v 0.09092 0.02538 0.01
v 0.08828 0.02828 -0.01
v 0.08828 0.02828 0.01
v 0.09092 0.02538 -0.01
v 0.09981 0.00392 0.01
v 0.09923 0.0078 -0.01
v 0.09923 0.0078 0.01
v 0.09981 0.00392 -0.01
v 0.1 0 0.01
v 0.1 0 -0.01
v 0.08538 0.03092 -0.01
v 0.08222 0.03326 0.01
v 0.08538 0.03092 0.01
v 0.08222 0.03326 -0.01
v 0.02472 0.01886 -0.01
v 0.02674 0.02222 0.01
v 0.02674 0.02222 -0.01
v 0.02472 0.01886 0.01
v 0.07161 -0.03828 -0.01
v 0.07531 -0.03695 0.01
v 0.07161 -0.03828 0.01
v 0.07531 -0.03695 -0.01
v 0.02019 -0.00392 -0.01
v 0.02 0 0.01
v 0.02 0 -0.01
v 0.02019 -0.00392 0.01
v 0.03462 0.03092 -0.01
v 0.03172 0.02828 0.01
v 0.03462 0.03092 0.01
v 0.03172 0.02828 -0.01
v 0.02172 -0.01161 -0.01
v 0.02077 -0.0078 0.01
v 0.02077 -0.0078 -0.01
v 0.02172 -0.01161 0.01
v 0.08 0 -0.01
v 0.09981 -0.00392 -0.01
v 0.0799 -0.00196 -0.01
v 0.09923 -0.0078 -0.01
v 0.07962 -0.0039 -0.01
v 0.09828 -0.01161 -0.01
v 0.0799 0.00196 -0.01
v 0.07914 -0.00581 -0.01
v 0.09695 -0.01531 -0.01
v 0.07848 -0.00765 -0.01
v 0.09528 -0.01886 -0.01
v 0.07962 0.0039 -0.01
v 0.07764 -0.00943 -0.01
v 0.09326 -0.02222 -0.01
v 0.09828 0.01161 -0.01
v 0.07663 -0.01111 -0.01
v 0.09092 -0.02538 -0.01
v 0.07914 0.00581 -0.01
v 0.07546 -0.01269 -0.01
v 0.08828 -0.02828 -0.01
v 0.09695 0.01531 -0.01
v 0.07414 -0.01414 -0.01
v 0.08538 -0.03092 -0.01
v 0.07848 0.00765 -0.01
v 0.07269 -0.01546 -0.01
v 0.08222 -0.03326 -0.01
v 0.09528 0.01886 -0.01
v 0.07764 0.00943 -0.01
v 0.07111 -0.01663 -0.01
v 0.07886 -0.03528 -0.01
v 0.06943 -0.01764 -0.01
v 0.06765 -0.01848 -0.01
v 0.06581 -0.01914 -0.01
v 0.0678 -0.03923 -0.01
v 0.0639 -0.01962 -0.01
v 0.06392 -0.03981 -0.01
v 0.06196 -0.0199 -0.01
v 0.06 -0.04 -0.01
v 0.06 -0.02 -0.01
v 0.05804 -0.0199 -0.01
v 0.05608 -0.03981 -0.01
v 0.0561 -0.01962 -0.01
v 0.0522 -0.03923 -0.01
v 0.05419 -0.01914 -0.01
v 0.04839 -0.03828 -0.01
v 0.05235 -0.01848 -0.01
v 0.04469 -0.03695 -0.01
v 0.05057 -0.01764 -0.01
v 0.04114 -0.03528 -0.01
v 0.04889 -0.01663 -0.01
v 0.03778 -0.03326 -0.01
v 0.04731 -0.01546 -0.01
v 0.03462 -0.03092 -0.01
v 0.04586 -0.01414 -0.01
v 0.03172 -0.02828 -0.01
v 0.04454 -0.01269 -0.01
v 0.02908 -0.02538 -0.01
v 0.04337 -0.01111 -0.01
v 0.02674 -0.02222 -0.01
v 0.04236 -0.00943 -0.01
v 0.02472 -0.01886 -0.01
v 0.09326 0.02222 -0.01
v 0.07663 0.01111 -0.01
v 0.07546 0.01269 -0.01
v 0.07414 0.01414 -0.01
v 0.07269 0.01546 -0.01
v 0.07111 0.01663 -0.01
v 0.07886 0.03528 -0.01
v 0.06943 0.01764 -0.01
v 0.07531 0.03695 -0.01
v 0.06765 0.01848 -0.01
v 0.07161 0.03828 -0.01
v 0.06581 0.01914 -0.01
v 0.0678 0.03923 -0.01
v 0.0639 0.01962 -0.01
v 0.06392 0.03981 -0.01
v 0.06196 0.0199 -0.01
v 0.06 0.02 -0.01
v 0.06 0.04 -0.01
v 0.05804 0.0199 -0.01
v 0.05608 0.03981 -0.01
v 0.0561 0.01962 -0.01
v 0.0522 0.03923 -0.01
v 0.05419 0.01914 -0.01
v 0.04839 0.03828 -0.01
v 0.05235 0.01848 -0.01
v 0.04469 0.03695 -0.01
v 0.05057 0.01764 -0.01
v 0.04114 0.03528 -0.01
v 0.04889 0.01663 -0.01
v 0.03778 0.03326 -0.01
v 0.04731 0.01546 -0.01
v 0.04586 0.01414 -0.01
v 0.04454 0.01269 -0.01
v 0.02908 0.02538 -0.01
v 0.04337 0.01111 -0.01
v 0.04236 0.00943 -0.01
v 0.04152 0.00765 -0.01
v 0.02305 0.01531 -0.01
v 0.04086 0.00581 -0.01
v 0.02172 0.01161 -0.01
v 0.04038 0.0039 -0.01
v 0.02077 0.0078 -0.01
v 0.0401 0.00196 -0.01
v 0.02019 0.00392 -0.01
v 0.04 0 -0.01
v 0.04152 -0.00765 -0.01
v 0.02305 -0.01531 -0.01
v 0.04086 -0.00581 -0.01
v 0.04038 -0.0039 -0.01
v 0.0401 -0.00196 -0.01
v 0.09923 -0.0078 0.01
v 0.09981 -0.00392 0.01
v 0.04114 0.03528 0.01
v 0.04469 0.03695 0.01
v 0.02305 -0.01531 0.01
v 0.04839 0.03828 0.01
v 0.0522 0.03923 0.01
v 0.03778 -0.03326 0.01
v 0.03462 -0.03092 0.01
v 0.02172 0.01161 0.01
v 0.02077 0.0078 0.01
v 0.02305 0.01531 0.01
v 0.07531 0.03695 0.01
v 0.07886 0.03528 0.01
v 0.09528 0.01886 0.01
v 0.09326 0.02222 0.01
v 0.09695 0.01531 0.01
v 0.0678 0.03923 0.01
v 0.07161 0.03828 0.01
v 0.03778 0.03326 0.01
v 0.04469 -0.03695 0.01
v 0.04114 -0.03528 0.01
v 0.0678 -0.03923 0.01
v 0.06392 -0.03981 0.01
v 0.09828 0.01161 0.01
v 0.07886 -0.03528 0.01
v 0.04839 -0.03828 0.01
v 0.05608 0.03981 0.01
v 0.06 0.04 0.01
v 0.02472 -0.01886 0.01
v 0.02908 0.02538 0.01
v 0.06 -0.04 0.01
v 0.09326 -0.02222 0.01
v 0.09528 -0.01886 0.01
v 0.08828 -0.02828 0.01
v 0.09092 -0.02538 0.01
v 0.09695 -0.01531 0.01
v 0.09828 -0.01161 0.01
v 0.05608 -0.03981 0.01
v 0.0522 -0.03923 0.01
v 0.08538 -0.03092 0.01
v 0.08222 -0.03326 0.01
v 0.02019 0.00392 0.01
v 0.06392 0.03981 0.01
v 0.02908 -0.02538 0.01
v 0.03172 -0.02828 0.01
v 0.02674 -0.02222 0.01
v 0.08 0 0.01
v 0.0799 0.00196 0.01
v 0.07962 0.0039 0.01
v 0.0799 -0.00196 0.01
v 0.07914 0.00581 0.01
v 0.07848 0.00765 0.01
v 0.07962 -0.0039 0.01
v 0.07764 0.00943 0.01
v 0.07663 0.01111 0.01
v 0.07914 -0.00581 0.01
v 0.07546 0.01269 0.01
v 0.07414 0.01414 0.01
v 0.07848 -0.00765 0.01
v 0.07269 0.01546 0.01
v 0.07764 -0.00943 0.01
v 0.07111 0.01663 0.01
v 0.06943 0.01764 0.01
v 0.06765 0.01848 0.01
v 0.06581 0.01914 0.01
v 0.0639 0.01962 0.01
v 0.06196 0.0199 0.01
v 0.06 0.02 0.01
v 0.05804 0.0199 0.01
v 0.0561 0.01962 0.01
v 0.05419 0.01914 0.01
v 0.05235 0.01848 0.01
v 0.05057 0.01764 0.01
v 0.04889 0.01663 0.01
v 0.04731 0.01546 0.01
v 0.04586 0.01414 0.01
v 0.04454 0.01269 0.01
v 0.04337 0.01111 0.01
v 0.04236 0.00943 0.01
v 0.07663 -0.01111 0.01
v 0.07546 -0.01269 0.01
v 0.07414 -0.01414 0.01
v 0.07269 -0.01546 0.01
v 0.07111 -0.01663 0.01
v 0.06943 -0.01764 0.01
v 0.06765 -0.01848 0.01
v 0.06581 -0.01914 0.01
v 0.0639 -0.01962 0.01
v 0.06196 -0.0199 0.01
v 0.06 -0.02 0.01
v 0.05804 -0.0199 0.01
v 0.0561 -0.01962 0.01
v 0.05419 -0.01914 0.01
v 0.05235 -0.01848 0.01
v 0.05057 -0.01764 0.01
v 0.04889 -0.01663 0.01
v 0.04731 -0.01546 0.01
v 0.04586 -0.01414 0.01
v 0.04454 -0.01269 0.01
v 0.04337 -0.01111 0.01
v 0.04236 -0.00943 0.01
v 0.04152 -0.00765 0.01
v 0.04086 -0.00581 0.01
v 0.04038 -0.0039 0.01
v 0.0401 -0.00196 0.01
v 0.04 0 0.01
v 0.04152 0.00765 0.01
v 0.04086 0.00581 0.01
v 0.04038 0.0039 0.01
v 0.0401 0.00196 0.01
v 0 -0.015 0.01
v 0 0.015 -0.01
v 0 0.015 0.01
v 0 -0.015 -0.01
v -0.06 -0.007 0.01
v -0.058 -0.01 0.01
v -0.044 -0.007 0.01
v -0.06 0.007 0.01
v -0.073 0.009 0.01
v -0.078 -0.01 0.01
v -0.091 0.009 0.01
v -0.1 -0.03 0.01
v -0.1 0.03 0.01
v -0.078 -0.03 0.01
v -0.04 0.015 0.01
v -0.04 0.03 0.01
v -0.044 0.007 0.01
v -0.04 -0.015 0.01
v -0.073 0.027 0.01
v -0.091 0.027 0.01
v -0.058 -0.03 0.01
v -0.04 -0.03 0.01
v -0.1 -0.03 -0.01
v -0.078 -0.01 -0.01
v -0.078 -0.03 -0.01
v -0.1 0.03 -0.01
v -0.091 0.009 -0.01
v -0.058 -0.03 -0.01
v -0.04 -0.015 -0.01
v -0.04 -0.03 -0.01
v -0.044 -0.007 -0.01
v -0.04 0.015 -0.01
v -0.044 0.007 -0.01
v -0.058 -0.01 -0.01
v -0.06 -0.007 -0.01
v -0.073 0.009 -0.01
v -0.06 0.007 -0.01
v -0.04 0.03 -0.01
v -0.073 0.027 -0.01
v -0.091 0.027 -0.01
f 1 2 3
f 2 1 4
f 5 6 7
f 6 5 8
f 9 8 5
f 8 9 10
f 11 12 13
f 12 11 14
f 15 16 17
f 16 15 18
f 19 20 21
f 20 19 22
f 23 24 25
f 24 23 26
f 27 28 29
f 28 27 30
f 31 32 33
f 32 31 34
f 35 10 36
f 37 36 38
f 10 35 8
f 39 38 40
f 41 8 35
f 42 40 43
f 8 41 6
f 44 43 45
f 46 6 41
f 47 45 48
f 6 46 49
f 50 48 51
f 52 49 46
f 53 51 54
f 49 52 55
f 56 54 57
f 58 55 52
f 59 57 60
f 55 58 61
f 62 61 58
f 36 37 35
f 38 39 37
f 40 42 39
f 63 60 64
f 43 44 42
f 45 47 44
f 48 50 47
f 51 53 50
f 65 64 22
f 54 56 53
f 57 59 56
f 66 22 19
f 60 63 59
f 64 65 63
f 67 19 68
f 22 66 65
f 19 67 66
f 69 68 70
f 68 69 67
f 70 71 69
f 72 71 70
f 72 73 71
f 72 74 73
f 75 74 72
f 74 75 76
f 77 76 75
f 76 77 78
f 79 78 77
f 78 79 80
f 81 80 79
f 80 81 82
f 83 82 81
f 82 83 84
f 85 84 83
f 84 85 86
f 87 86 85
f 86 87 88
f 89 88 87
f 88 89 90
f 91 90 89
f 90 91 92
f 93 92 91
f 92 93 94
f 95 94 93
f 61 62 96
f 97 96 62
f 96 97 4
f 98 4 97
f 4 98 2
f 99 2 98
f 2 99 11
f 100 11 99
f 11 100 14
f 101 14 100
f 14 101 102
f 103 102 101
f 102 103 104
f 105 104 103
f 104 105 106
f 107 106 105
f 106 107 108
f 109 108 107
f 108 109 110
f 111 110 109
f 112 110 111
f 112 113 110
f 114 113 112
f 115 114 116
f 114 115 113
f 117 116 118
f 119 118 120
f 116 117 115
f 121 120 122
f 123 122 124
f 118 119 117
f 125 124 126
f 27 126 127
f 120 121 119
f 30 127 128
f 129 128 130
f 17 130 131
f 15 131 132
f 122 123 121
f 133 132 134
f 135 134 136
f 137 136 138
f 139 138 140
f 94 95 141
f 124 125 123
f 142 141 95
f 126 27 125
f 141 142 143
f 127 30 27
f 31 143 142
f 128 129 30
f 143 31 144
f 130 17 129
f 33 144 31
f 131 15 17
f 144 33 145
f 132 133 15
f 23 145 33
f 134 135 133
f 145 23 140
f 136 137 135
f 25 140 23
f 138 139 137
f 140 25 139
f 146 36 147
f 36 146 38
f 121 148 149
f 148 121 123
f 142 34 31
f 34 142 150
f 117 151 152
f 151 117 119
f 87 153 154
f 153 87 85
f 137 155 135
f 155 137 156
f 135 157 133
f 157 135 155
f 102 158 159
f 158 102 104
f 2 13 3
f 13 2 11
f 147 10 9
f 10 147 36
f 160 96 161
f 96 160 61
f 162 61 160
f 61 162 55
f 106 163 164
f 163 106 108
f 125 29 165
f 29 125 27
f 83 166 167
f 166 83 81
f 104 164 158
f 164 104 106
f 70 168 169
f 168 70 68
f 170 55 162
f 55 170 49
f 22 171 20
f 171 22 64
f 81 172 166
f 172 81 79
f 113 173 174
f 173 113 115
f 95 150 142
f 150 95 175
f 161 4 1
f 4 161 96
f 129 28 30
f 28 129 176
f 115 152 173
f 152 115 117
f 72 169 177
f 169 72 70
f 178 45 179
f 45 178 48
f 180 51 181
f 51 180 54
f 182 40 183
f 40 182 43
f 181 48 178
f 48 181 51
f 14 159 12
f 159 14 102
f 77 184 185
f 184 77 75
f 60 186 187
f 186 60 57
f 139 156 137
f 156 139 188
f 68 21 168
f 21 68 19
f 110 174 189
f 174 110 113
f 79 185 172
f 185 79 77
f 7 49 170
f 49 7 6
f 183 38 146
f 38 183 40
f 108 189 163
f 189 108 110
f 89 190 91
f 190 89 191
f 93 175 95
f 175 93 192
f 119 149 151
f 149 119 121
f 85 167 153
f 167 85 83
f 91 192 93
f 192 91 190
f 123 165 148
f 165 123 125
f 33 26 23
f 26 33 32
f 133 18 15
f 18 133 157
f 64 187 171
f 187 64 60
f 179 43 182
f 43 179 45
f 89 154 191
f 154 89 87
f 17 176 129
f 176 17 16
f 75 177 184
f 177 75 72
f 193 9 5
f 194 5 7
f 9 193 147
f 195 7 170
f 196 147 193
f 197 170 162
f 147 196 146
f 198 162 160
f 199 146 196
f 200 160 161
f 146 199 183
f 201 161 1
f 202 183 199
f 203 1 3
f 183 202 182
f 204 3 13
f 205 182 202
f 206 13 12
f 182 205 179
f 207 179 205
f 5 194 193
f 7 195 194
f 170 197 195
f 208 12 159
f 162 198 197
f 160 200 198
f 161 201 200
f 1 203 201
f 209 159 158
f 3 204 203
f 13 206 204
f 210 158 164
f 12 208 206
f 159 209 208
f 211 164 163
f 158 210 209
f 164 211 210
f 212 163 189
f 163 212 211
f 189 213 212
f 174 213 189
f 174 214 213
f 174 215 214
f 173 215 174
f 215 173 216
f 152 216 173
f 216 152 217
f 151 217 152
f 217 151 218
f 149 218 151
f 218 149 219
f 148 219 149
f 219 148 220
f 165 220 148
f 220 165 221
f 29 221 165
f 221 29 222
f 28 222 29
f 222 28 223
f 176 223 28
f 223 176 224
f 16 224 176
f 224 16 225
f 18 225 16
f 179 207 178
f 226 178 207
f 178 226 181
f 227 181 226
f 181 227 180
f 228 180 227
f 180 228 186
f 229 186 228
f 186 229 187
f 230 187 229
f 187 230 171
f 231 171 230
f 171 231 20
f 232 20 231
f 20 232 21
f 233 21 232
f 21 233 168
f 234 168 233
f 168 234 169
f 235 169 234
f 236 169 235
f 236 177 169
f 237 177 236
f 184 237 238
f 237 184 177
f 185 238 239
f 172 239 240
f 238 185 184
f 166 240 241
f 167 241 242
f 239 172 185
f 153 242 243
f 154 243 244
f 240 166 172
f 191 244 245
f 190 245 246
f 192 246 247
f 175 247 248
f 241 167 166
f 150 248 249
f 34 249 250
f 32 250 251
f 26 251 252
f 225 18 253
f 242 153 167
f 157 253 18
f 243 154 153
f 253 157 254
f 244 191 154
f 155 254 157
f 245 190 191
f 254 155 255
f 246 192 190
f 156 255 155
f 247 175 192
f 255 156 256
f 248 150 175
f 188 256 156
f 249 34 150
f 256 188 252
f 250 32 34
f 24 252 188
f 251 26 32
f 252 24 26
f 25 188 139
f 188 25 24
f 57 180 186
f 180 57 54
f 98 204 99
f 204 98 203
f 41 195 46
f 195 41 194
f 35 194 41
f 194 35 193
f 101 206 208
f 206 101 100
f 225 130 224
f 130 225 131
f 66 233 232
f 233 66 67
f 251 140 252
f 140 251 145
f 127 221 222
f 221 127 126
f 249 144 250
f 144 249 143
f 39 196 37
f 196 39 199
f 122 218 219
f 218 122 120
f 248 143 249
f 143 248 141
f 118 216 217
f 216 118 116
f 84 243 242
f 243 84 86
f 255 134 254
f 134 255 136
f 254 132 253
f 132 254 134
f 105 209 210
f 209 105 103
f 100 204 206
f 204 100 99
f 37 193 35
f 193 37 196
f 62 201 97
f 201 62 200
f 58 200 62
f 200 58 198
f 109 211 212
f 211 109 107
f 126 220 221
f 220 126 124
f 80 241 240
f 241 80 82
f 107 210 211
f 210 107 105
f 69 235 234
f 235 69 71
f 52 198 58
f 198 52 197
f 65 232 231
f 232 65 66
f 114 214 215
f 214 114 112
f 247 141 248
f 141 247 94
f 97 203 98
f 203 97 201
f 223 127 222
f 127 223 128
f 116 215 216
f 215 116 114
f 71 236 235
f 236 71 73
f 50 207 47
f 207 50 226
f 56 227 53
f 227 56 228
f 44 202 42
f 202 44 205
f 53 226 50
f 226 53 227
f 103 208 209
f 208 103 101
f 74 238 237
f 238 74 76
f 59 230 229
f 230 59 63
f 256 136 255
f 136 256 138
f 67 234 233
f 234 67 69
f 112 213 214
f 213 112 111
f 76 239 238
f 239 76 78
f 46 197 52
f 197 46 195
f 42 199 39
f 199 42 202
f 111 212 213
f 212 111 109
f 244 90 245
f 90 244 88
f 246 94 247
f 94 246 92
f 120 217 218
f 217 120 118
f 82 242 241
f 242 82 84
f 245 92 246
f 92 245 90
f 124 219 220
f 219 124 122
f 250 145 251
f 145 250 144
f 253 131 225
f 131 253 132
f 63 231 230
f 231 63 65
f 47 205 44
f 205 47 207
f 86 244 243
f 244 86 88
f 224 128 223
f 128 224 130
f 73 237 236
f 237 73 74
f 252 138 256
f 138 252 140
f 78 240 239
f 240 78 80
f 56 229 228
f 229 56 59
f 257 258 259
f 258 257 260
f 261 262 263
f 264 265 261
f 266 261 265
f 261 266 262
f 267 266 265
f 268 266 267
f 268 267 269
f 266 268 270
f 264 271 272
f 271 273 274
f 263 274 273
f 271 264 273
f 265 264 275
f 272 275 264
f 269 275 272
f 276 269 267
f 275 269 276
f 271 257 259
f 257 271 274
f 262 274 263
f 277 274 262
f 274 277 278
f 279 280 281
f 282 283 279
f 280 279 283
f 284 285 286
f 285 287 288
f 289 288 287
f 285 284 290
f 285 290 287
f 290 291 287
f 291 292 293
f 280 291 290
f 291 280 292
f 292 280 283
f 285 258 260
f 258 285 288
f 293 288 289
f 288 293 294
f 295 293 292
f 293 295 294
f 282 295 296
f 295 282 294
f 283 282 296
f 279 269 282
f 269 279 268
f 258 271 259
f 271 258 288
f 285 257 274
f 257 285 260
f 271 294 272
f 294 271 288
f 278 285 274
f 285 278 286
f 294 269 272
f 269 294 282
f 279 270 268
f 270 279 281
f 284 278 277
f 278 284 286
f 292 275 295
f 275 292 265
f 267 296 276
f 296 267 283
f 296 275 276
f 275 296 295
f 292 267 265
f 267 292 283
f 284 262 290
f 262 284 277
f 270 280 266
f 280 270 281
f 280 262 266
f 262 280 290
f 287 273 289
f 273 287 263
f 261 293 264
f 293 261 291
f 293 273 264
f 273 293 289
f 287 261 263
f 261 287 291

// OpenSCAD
$fn=64;

th = 0.02;
L = 0.2;
H = 0.1;

bow_od = 0.08;
bow_id = 0.04;
bow_center_x = L/2 - bow_od/2;

bit_len = 0.06;
bit_h = 0.06;

shank_len = L - bow_od/2 - bit_len;
shank_h = 0.03;

module bow_ring(thk){
    difference(){
        cylinder(h=thk, d=bow_od, center=true);
        cylinder(h=thk+0.01, d=bow_id, center=true);
    }
}

module shank(thk){
    translate([(-L/2 + shank_len/2), 0, 0])
        cube([shank_len, shank_h, thk], center=true);
}

module bit_base(thk){
    translate([(-L/2 + bit_len/2), 0, 0])
        cube([bit_len, bit_h, thk], center=true);
}

module bit_notches(thk){
    union(){
        translate([(-L/2 + 0.018), 0.018, 0])
            cube([0.018, 0.018, thk+0.02], center=true);
        translate([(-L/2 + 0.032), -0.02, 0])
            cube([0.02, 0.02, thk+0.02], center=true);
        translate([(-L/2 + 0.048), 0.0, 0])
            cube([0.016, 0.014, thk+0.02], center=true);
    }
}

module triangular_tooth(thk){
    linear_extrude(height=thk, center=true)
        polygon(points=[
            [-L/2 + 0.012, -0.01],
            [-L/2 + 0.012,  0.01],
            [-L/2 + 0.000,  0.00]
        ]);
}

module key_plate(){
    difference(){
        union(){
            translate([bow_center_x, 0, 0]) bow_ring(th);
            shank(th);
            bit_base(th);
            triangular_tooth(th);
        }
        bit_notches(th);
    }
}

key_plate();
